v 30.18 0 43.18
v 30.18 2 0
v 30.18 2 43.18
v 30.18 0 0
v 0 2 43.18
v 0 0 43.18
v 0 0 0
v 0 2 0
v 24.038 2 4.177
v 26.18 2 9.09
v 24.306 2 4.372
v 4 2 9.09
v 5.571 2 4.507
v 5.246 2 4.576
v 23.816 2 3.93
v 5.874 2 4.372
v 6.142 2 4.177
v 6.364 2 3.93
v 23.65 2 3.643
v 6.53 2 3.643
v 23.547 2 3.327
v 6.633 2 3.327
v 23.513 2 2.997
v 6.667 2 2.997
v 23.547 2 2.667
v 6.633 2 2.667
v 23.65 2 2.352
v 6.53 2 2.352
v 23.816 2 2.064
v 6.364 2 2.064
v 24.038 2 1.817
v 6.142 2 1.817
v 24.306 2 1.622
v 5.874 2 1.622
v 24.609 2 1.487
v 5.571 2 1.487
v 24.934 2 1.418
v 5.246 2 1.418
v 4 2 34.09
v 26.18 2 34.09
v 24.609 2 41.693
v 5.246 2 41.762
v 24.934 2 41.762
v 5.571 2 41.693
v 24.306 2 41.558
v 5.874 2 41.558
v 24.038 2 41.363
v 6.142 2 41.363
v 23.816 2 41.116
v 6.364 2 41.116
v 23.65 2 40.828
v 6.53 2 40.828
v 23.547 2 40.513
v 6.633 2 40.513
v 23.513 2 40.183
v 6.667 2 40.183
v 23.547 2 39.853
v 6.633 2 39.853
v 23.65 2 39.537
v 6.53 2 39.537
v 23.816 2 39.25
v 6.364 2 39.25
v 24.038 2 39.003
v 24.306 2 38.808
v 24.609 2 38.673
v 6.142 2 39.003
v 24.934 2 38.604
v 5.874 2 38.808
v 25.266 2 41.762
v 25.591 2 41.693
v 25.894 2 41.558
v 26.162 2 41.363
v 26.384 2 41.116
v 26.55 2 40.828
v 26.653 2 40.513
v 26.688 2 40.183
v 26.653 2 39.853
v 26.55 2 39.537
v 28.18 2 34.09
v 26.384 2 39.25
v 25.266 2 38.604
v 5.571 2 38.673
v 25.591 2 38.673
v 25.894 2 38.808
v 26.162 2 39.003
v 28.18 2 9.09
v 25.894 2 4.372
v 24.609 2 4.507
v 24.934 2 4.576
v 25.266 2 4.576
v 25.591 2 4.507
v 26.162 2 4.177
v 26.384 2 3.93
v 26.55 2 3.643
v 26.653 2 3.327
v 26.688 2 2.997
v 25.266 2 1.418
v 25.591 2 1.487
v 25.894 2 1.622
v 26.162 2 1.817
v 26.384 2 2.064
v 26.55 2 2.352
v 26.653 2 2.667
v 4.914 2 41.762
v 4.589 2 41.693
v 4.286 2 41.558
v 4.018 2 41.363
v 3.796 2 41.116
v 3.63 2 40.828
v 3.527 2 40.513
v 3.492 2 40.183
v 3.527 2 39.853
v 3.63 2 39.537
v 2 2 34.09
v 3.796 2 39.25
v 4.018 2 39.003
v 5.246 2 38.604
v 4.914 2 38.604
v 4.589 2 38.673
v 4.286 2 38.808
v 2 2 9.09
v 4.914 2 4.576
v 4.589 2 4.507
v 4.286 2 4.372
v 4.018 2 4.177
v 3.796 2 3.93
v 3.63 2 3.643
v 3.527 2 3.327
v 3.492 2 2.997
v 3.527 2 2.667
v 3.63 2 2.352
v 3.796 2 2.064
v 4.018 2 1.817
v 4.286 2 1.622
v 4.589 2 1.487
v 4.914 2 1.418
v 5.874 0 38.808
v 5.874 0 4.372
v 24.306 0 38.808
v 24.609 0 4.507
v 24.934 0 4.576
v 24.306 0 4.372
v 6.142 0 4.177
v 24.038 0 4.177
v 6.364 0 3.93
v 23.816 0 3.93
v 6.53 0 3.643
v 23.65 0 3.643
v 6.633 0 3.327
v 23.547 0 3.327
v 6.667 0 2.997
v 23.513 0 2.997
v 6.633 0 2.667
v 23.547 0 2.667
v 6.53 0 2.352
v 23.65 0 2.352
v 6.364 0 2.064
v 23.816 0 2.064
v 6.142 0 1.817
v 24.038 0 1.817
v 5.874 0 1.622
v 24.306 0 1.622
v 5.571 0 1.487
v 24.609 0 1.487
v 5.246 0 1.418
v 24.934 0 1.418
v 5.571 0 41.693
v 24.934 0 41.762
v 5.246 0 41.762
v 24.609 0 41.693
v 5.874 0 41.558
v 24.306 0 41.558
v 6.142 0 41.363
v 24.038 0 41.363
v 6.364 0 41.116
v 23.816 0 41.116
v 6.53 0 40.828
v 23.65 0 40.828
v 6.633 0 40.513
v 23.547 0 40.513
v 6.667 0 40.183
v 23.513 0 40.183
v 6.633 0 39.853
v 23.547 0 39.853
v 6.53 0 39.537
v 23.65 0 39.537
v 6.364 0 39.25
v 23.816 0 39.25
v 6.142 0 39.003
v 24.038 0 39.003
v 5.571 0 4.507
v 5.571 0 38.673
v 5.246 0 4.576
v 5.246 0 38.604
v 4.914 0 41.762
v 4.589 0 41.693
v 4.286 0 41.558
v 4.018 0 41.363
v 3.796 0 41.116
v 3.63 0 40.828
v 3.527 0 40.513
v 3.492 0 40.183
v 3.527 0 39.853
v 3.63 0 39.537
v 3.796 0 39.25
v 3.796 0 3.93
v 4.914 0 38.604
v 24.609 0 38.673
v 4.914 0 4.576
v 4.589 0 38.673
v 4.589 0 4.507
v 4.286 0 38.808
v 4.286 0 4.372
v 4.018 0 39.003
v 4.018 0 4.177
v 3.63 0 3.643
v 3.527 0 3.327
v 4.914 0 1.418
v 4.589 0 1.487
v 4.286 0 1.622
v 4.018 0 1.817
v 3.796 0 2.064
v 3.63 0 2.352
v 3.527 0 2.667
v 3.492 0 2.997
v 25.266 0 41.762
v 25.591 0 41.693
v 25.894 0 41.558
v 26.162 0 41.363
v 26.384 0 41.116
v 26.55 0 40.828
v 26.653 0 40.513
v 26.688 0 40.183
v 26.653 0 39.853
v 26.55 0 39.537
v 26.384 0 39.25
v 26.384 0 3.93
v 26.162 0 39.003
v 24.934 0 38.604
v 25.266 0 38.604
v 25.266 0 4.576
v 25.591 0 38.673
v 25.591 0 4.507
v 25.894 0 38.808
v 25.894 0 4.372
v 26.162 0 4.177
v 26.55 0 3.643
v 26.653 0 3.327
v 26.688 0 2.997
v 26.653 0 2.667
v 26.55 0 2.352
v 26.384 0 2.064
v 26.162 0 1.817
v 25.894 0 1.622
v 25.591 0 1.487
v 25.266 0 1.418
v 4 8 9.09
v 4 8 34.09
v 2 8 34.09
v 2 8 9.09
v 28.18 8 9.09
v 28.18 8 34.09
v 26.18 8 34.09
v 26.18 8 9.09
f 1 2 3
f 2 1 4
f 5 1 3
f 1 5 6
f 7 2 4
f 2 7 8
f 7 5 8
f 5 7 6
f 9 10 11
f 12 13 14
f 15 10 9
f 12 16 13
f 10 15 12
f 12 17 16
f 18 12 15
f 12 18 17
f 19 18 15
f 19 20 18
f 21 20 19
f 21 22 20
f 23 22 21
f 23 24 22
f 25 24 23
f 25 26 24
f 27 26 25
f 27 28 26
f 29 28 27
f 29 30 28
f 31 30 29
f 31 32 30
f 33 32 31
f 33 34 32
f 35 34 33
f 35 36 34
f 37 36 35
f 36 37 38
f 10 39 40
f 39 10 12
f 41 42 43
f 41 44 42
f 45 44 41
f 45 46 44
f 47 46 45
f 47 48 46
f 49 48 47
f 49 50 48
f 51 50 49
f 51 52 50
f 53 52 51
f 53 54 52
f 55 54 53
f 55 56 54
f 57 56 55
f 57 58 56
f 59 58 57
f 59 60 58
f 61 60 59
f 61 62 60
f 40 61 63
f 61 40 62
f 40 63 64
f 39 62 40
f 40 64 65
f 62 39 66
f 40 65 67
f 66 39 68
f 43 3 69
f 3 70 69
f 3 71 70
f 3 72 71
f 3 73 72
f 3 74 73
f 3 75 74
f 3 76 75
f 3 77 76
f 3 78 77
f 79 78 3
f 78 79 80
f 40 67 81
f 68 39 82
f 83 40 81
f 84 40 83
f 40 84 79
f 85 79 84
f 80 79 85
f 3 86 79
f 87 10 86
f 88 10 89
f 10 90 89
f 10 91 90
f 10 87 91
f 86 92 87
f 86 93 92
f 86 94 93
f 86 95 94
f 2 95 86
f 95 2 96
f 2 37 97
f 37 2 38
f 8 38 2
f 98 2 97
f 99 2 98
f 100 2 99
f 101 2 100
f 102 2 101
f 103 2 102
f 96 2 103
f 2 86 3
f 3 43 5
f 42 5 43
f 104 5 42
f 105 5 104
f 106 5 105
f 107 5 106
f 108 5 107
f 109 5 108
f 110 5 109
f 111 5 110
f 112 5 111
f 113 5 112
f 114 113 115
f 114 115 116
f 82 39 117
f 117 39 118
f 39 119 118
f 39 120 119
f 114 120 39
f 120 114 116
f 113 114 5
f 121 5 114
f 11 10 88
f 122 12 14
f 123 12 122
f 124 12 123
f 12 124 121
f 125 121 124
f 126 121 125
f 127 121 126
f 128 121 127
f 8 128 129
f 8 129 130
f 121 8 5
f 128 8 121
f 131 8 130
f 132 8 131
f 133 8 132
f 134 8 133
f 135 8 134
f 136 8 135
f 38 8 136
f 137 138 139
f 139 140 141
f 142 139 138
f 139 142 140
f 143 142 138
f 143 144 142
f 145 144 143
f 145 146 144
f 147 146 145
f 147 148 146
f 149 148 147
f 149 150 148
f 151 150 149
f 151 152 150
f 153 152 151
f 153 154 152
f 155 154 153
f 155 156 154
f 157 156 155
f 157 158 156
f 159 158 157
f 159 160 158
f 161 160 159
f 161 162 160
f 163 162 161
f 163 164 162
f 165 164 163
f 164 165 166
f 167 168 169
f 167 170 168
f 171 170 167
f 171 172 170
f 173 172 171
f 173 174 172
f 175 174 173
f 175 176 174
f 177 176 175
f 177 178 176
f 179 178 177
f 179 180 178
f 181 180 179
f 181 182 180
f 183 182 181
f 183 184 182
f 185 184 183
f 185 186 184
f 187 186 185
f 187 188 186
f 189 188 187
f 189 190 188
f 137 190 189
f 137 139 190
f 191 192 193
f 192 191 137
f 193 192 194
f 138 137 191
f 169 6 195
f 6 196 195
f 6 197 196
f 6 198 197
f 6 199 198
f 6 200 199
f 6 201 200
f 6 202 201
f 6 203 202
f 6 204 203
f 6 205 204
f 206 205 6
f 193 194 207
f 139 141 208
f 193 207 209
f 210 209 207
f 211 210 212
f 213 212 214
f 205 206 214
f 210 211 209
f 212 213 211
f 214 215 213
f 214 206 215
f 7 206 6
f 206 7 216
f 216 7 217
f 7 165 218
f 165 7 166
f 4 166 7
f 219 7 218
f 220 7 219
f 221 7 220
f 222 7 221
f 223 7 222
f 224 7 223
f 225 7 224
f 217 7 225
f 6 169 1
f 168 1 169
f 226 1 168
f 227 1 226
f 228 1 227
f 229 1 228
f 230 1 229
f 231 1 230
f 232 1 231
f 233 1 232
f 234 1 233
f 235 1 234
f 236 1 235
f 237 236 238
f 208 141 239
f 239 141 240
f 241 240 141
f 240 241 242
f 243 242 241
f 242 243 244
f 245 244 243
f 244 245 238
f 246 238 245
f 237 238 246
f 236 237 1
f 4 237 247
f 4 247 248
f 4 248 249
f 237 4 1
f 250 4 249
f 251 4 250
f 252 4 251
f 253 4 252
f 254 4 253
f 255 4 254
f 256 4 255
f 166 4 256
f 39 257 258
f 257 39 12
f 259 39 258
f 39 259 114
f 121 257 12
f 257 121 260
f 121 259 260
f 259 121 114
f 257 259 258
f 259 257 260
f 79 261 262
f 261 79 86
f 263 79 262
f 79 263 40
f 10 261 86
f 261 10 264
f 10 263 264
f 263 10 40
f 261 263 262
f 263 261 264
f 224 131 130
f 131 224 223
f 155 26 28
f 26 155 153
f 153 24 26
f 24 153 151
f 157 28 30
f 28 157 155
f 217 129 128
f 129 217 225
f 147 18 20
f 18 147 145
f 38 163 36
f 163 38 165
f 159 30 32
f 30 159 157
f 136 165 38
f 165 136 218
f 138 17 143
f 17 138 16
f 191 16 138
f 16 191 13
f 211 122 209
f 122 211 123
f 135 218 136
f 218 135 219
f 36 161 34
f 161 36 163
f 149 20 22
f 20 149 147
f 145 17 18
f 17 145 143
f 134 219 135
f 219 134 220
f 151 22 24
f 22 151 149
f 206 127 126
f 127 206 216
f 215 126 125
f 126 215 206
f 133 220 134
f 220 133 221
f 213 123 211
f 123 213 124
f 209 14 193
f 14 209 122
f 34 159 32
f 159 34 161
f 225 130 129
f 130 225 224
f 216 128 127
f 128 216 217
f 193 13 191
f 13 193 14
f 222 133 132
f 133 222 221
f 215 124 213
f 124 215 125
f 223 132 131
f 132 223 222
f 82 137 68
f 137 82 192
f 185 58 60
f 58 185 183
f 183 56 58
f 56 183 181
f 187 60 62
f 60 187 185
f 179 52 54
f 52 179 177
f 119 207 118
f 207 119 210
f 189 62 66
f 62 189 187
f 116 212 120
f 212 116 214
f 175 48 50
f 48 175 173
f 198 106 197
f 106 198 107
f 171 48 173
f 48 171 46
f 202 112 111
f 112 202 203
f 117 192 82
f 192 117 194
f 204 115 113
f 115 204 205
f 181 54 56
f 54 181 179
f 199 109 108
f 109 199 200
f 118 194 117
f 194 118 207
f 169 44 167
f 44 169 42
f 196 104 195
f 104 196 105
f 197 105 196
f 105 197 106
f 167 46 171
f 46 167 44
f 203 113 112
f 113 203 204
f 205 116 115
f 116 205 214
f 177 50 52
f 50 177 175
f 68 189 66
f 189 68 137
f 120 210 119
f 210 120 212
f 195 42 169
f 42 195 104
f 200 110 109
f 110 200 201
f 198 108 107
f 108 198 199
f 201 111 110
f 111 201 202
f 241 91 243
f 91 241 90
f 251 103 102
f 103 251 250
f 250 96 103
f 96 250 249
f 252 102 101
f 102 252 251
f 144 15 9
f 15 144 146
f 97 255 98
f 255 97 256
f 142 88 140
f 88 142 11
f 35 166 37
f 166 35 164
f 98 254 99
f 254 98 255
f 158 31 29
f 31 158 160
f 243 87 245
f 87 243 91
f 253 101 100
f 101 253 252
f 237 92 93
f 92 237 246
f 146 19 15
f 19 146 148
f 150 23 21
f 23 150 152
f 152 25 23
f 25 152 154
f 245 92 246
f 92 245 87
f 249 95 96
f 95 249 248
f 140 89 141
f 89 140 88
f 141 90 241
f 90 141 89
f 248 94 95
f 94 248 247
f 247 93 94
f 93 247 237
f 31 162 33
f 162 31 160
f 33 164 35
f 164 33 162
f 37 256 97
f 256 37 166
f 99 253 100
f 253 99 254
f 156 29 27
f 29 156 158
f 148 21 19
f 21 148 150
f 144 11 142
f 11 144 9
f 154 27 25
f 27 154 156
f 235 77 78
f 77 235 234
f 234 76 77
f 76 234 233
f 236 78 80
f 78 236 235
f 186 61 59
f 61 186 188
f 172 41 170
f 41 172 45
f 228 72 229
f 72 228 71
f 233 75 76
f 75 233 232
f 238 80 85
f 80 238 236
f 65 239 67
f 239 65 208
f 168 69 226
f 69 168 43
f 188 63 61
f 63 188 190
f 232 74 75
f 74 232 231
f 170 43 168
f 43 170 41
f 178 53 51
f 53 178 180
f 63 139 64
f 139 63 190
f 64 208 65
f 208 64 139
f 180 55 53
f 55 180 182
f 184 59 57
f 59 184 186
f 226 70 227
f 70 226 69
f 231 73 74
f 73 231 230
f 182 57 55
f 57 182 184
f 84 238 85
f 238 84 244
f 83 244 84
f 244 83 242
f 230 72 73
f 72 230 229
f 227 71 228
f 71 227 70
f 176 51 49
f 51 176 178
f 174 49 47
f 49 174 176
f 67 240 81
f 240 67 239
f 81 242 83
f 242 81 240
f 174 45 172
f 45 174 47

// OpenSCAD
// file: tile_common.scad
/*
Common modules and functions for 1U Tiles
*/

function inches( x) = x * 25.4; // convert inches to mm

// put a hole in the tile of diameter 'd' at position 'x','z'
module hole( x, z, d) {
    translate([x, 0, z])
        rotate([270,0,0])
            cylinder(r=(d / 2), h=10, center=true);
}
// main file
/*
A Pulp Logic compatible 1U blank tile.

based on the dimensions given here:
http://pulplogic.com/1u_tiles/

units: millimeters
*/

use <tile_common.scad>;

hp = 6; // width in hole points
plate_height = inches(1.7); // spec is 1.7"
plate_width = hp * 5.08 - 0.3; // general conversion factor with fudge for tolerance

module front_face() {
    thickness = 2; // thickness of PCB front panels
    cube([plate_width, thickness, plate_height], center=false);
}

rib_width = 2;
rib_inset = 2;
rib_height = 25; // max physically measured at 29.06
rib_depth = 8;
module left_stiffening_rib() {
    translate([rib_inset, 0, ((plate_height - rib_height) / 2)]){
        cube([rib_width, rib_depth, rib_height], center=false);
    }
}

module right_stiffening_rib() {
    translate([((plate_width - rib_width) - rib_inset), 0, ((plate_height - rib_height) / 2)]){
        cube([rib_width, rib_depth, rib_height], center=false);
    }
}

module material() {
    union() {
        front_face();
        left_stiffening_rib();
        right_stiffening_rib();
    }
}

module mounting_holes() {
    // make round shapes more fine
    $fs = 0.1;

    mounting_hole_dia = inches(0.125); // spec 0.125"
    hole_horiz_offset = inches(0.200); // spec 0.200"
    hole_vert_offset = inches(0.118); // spec 0.118"

    module hole_pair(h_offset) {
        hole(x=h_offset, z=hole_vert_offset, d=mounting_hole_dia);
        
        hole(x=h_offset, z=(plate_height - hole_vert_offset), d=mounting_hole_dia);
    }
    hole_pair(hole_horiz_offset);
    hole_pair(plate_width - hole_horiz_offset);
}

module cutouts() {
    mounting_holes();
}
module blank_tile() {
    difference() {
        material();
        cutouts();
    }
}

blank_tile();
